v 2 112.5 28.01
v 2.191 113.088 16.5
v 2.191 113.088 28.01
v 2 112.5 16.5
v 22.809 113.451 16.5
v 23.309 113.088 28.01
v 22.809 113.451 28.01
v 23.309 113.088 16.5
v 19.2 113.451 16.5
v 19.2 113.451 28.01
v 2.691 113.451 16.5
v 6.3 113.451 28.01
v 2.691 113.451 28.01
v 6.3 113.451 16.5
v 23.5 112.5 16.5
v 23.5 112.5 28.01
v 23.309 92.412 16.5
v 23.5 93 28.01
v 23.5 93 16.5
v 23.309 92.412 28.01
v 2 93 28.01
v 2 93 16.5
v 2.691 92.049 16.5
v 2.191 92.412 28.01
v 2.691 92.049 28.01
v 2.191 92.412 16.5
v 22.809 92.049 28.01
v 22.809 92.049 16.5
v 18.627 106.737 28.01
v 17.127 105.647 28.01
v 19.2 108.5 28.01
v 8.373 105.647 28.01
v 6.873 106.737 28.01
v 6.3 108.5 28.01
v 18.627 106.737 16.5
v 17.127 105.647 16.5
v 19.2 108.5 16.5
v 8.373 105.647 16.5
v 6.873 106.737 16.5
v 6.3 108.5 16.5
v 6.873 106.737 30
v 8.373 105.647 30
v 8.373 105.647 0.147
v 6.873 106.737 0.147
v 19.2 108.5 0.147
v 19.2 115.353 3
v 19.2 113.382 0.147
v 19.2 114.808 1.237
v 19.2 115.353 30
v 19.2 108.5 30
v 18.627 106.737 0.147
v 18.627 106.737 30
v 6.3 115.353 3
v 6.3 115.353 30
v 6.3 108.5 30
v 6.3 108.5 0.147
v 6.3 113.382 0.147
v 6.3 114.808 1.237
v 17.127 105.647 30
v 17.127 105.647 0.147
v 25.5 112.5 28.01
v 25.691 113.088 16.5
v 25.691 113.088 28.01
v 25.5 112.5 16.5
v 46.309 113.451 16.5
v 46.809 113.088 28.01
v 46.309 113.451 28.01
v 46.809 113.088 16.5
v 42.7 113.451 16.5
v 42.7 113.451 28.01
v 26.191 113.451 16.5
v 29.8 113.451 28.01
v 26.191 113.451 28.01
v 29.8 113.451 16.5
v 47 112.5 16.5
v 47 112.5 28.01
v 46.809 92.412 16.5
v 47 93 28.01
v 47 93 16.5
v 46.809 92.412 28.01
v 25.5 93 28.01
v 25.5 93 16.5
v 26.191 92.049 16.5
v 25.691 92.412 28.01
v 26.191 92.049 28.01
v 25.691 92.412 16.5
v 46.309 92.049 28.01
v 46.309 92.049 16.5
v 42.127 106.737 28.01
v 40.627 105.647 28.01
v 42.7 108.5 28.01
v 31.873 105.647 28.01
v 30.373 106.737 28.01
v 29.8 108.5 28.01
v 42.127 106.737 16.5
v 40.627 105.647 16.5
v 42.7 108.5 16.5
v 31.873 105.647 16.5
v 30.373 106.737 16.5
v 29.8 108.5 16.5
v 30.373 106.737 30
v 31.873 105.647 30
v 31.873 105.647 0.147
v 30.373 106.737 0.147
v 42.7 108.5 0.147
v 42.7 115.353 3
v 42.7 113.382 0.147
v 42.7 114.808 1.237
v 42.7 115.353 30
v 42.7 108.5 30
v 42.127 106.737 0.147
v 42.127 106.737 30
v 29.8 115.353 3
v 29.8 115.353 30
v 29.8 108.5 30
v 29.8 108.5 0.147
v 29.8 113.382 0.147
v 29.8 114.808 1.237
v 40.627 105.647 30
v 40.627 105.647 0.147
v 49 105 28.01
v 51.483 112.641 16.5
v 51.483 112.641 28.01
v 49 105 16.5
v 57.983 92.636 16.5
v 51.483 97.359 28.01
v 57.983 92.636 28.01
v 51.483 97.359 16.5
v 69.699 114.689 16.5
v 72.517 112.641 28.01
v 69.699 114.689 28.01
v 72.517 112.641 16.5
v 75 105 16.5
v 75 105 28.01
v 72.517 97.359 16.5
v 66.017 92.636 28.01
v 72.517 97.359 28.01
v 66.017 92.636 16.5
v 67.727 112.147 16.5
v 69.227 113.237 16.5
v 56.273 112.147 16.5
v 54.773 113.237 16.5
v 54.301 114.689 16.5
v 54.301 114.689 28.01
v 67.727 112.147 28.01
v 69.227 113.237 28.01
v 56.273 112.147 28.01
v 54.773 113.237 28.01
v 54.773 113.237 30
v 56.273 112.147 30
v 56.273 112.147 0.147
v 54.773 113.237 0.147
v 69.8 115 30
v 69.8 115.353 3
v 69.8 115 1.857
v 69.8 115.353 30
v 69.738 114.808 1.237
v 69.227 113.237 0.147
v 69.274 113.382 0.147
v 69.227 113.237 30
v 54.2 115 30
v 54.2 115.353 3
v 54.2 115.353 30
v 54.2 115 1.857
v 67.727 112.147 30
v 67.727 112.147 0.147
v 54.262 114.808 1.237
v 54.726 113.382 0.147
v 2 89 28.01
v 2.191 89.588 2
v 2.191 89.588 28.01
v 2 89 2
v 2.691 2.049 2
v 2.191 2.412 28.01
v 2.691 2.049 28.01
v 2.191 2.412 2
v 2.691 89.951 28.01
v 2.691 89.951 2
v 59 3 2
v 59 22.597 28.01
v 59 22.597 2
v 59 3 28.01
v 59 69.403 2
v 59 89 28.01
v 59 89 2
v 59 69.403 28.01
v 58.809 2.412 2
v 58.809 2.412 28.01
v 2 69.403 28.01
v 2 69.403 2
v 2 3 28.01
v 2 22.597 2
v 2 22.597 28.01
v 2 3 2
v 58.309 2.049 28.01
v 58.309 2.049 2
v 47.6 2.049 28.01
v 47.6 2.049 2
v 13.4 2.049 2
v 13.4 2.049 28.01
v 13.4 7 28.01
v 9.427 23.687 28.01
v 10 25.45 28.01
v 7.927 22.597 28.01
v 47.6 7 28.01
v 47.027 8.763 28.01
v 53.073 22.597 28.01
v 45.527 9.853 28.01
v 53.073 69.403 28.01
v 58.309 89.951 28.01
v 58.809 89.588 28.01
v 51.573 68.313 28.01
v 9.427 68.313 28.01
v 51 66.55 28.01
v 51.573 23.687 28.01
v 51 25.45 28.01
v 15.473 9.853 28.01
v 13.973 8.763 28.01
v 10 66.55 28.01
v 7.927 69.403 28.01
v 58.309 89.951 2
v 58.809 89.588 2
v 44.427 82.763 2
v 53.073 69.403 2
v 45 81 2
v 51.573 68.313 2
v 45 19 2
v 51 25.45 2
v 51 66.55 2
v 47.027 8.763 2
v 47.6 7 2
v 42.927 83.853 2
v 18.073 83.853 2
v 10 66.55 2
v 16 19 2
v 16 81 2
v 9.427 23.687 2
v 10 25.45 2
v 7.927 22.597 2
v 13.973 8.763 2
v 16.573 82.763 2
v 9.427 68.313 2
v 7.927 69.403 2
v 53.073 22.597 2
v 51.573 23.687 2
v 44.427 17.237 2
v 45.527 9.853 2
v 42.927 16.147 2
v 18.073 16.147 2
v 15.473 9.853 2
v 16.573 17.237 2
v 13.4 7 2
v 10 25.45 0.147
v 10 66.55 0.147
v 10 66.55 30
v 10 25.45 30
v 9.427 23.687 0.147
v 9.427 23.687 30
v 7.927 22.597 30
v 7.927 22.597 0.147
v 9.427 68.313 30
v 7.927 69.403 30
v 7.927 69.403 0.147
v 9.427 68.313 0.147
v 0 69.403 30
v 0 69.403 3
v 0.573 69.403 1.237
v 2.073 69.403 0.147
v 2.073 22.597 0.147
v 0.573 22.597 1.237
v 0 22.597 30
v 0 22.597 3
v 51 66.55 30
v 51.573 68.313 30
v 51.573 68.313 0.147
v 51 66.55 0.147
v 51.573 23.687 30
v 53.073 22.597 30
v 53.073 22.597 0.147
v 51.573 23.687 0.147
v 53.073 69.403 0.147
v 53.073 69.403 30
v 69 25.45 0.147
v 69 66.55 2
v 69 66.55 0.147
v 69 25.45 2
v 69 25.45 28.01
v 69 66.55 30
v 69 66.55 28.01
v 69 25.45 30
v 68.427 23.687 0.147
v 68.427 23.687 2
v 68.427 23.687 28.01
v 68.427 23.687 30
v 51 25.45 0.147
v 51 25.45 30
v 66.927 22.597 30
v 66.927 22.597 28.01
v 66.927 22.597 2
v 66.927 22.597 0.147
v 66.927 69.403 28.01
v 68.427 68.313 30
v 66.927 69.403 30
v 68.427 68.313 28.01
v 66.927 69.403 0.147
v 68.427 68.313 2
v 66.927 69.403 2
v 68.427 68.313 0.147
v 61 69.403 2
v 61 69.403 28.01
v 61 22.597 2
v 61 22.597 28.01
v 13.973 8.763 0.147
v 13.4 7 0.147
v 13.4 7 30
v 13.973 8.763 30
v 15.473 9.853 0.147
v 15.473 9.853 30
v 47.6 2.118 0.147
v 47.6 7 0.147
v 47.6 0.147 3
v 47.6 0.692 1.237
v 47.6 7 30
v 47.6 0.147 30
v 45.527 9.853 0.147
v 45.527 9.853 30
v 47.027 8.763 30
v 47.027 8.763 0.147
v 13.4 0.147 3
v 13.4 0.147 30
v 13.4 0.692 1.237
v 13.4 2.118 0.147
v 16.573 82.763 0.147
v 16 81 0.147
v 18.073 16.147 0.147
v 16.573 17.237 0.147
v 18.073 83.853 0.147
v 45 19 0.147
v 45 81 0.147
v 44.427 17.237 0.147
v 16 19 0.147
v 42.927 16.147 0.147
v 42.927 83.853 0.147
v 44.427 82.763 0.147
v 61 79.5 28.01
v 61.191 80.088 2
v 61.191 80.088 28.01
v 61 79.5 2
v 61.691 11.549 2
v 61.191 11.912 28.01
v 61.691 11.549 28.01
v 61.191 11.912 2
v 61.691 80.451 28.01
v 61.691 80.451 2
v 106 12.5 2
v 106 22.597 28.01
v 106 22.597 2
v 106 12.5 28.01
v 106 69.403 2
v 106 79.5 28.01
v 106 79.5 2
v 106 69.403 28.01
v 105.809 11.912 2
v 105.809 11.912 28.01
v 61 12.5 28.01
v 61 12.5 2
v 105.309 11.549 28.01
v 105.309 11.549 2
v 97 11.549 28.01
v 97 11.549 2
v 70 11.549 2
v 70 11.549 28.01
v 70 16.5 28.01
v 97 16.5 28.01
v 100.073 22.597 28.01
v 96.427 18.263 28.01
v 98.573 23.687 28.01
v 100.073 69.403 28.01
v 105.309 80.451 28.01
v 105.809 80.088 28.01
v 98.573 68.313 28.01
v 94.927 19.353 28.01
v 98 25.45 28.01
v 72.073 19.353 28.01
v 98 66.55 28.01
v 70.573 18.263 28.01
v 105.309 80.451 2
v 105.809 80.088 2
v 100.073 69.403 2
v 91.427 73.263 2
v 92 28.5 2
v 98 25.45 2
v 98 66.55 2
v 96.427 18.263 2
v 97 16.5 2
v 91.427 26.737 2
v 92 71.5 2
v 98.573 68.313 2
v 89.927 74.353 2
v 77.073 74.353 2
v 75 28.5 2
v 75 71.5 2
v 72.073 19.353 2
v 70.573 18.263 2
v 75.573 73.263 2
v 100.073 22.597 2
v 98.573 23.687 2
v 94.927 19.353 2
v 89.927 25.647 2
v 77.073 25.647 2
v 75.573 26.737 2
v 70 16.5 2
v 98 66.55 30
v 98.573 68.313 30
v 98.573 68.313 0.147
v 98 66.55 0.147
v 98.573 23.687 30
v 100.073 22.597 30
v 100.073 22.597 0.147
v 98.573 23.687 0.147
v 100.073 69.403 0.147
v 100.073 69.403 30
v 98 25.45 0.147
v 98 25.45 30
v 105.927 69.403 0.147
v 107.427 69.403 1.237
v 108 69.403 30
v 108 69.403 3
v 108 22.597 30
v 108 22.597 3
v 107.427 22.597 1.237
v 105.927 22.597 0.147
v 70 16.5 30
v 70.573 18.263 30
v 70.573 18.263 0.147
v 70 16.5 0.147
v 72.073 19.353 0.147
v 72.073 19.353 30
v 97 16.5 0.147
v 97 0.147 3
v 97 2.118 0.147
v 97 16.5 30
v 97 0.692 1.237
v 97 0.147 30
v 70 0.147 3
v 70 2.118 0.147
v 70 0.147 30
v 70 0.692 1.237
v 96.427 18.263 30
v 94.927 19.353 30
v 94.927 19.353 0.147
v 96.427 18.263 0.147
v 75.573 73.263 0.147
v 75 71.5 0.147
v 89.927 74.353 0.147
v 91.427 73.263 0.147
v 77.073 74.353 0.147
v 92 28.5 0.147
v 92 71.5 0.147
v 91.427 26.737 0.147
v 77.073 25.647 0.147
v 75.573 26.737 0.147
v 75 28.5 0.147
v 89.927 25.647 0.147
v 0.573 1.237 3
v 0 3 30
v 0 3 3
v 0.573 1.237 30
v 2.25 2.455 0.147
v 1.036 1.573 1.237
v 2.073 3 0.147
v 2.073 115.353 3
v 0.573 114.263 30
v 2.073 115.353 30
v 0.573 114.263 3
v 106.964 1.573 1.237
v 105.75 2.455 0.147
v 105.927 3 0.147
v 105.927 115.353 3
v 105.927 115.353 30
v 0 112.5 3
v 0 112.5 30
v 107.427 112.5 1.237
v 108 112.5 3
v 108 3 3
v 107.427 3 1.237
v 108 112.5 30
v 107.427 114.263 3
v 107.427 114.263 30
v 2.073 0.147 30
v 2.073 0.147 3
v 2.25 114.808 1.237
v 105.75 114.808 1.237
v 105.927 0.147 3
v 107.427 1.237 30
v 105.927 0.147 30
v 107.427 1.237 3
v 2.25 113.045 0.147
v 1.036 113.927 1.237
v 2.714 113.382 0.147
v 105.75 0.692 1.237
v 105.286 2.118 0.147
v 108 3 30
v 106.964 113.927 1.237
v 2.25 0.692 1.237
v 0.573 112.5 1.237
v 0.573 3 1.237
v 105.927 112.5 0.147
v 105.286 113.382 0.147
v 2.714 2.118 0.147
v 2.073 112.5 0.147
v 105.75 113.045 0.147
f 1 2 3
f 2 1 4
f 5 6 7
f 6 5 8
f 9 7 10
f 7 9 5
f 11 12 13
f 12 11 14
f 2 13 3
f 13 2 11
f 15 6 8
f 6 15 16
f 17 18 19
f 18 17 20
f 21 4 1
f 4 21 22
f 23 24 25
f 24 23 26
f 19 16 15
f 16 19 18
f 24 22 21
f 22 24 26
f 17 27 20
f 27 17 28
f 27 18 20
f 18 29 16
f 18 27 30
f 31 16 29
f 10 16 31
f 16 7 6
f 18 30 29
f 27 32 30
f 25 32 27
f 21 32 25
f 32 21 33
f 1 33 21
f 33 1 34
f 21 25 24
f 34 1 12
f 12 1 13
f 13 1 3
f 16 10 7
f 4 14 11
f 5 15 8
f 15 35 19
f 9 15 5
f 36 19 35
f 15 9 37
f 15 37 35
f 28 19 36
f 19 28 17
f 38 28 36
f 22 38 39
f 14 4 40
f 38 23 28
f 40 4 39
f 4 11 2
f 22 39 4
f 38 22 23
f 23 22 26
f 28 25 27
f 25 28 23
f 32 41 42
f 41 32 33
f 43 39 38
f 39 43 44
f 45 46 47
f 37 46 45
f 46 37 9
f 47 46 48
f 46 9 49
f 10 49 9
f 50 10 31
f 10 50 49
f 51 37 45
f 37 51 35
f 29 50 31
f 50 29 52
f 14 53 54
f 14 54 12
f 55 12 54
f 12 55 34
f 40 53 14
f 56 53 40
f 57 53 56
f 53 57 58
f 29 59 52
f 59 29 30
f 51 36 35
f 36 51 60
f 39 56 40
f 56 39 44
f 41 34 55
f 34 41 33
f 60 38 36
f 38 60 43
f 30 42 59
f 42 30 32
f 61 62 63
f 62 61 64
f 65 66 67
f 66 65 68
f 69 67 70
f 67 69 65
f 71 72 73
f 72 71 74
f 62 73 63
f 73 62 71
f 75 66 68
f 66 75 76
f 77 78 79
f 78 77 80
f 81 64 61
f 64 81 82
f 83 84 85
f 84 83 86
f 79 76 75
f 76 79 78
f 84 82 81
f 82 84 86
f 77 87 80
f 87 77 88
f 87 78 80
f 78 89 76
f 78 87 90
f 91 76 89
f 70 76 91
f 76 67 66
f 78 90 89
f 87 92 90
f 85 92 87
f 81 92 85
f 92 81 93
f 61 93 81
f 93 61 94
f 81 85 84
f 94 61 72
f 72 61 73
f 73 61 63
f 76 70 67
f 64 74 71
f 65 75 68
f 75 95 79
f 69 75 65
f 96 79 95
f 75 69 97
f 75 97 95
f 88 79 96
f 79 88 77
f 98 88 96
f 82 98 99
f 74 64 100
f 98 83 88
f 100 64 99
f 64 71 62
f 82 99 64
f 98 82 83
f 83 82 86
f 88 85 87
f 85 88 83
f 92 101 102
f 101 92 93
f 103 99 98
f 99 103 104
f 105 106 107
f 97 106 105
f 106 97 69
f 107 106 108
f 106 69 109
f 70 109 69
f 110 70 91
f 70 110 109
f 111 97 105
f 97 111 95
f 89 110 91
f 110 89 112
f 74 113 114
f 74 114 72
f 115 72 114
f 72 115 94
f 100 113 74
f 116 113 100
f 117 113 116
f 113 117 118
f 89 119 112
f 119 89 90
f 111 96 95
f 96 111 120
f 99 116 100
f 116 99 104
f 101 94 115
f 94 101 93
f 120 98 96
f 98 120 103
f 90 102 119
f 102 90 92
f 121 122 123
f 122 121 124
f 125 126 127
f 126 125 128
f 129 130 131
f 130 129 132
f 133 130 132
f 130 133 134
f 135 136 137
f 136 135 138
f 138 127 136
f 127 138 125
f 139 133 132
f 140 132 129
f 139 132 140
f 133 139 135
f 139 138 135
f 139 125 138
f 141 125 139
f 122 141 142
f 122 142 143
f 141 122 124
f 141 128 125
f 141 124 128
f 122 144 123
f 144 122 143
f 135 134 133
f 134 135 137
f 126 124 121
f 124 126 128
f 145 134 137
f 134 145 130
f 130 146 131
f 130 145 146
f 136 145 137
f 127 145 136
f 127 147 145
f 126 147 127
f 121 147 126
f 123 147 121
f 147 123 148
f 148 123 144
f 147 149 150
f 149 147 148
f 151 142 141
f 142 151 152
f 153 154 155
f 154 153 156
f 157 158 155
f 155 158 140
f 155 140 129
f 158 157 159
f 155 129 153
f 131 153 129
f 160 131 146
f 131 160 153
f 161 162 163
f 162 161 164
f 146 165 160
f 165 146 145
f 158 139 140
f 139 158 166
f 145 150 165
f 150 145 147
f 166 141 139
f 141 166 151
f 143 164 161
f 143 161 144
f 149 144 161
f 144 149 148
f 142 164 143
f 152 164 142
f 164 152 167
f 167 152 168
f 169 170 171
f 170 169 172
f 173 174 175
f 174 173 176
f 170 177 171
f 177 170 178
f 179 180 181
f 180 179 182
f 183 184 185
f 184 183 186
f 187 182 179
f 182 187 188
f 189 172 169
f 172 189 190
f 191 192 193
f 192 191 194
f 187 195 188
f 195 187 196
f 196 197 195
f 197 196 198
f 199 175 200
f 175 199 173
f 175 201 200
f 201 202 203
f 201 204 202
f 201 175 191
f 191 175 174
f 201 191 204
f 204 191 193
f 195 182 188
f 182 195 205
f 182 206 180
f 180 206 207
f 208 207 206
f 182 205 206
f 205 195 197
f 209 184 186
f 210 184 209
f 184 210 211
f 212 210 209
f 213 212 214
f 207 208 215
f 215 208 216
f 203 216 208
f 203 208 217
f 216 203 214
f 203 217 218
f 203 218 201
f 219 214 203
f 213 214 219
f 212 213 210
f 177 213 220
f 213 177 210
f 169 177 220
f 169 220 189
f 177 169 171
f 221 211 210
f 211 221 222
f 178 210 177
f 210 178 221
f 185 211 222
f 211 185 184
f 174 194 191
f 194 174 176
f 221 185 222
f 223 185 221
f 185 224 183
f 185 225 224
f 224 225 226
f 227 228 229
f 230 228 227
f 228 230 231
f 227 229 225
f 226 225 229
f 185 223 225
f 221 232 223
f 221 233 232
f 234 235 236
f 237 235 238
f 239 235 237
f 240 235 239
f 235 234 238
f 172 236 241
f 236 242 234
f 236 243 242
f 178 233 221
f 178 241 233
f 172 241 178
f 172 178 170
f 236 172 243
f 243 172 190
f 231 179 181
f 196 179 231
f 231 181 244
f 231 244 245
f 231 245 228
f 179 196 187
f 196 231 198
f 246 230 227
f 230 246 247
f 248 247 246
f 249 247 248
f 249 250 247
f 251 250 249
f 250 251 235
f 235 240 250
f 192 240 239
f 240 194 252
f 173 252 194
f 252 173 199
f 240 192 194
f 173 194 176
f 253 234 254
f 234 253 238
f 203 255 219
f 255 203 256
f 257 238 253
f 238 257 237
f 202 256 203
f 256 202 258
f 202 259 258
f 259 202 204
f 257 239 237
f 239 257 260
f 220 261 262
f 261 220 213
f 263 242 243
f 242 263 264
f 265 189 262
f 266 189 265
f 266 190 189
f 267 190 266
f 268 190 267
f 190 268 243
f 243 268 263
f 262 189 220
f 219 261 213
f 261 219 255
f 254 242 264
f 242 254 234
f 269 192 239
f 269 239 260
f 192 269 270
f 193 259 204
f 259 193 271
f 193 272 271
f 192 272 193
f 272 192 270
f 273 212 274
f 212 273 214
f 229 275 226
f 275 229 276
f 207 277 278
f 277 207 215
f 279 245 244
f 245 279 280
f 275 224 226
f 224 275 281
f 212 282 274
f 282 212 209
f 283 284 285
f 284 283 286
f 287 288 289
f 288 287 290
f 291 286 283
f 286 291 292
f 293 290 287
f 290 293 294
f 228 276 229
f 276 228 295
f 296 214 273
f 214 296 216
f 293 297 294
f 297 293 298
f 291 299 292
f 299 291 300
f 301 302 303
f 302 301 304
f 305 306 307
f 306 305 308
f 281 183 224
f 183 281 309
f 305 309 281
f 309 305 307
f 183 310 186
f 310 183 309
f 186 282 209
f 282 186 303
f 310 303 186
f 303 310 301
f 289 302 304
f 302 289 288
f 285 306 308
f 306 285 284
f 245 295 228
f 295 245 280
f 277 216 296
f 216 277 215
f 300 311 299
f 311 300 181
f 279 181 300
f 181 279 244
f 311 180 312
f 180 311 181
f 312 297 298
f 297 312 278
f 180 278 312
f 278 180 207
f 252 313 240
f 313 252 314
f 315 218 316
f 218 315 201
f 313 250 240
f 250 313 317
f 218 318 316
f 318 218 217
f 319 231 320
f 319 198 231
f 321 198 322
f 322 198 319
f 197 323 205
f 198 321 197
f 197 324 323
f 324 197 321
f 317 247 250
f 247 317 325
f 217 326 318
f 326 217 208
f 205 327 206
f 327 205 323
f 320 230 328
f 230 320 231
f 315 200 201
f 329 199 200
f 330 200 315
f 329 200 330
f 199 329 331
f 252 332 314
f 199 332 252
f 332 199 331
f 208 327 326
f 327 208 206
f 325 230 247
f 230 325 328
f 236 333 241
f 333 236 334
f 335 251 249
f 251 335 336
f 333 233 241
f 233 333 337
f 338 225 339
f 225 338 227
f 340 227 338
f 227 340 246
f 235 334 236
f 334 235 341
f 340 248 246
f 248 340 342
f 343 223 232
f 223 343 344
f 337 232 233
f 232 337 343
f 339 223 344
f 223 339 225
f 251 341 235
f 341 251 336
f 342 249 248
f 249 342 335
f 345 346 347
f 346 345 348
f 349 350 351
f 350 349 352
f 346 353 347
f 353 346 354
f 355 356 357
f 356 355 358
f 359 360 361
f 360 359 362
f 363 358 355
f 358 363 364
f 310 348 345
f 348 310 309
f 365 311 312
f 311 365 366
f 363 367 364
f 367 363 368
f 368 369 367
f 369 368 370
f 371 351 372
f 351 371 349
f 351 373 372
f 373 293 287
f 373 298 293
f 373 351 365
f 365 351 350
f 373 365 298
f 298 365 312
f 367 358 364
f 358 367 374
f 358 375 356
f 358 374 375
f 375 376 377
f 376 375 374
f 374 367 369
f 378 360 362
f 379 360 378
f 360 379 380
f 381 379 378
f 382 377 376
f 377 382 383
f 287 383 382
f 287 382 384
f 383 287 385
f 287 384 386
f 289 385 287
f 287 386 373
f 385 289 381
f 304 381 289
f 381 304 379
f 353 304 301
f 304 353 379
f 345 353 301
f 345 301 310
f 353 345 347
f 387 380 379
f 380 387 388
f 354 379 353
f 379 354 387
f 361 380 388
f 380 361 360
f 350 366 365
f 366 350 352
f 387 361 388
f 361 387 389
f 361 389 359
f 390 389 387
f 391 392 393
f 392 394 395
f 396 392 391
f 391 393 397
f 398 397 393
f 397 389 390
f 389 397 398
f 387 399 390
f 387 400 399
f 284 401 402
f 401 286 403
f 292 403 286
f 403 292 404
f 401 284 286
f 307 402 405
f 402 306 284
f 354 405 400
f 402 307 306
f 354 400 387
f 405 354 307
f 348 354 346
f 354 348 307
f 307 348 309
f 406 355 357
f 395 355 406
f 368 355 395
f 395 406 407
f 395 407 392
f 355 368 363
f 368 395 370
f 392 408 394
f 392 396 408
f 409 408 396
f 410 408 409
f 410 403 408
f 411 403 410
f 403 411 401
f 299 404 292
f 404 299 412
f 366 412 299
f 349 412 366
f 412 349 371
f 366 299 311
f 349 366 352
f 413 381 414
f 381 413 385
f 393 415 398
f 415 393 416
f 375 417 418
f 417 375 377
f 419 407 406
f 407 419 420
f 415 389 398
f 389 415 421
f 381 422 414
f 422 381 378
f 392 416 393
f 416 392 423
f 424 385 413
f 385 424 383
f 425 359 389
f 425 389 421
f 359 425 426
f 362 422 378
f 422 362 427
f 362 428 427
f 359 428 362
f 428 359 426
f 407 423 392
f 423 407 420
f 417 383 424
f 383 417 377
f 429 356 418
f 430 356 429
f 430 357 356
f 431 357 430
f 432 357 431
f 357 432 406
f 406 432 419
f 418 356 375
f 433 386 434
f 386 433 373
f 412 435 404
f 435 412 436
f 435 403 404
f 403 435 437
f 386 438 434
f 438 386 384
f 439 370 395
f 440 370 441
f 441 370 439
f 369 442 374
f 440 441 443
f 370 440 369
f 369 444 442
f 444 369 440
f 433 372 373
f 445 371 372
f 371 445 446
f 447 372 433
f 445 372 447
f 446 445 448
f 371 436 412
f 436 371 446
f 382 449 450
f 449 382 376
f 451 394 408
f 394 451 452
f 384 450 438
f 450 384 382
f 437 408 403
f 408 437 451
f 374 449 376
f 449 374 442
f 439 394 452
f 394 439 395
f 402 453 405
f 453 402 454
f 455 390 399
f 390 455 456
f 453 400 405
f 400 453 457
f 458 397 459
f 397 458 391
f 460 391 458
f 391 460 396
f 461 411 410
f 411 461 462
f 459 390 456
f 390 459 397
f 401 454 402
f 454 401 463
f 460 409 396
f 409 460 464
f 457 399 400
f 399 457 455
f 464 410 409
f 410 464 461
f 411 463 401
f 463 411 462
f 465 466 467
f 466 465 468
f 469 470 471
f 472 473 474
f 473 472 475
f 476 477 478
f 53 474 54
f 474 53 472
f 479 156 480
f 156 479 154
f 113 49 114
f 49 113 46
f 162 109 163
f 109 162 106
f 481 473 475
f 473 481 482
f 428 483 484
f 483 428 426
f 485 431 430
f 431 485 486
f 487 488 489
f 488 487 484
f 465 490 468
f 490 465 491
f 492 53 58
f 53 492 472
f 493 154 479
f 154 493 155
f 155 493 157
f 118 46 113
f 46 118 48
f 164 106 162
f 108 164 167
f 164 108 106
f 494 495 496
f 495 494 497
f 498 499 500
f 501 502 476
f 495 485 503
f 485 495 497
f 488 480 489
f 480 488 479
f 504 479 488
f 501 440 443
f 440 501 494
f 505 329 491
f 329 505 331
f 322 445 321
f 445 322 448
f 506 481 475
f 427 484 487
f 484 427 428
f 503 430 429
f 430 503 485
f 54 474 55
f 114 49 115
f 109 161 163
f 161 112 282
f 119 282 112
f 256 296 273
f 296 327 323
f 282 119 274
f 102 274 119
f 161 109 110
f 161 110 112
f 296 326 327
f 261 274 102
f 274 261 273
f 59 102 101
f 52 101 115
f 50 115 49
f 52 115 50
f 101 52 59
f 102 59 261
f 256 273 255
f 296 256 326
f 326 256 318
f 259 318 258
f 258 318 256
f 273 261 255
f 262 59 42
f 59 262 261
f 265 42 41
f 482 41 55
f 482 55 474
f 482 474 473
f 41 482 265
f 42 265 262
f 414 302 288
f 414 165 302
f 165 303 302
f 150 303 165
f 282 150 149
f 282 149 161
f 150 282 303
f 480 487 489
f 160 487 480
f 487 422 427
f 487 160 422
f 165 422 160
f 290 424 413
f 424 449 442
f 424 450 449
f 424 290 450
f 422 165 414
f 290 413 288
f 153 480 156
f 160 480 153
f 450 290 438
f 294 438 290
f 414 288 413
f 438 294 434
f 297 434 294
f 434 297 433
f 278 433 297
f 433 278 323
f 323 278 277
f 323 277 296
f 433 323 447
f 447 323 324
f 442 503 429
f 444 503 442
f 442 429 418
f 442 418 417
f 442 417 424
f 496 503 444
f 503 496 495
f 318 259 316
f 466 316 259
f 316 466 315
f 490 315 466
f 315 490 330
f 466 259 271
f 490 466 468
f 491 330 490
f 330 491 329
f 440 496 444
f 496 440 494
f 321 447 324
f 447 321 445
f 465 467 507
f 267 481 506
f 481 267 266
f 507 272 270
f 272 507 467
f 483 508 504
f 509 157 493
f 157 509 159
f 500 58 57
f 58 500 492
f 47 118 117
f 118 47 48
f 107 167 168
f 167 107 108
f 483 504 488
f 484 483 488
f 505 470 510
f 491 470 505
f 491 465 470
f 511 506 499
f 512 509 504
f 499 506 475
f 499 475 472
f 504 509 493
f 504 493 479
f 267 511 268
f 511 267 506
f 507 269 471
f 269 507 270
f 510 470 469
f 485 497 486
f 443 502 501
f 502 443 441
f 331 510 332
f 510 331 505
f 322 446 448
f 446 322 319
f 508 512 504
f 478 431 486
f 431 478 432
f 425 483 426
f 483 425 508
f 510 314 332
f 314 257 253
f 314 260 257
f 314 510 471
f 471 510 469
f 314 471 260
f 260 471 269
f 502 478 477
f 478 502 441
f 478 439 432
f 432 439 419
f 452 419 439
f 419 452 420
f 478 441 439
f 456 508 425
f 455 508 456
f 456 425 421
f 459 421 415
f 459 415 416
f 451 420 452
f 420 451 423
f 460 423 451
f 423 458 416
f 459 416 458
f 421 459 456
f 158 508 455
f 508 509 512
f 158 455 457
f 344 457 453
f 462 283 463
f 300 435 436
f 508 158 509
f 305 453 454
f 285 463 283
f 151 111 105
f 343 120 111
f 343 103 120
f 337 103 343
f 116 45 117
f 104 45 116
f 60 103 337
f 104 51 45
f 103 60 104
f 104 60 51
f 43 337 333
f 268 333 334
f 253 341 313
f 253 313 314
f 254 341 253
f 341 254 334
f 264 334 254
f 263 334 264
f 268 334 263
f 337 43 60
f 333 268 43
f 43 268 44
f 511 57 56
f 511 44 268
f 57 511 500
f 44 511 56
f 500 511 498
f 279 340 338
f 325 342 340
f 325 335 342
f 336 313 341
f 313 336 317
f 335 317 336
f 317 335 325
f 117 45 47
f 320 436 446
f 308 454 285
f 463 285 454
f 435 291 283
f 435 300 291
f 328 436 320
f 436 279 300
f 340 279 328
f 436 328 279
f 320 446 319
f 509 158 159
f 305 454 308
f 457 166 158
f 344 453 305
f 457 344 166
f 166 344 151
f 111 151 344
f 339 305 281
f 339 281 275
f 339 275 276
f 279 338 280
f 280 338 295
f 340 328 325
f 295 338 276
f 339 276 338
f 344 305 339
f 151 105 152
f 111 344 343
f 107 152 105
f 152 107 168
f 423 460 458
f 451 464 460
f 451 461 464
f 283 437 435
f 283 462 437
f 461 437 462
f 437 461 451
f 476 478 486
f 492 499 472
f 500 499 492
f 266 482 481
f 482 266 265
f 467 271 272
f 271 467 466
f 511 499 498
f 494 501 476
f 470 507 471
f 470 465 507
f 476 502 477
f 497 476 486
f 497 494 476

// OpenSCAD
// file: ../../vendor/honeycomb.scad
/**
 * Honeycomb library
 * License: Creative Commons - Attribution
 * Copyright: Gael Lafond 2017
 * URL: https://www.thingiverse.com/thing:2484395
 *
 * Inspired from:
 *   https://www.thingiverse.com/thing:1763704
 */

// a single filled hexagon
module hexagon(l)  {
	circle(d=l, $fn=6);
}

// parametric honeycomb  
module honeycomb(x, y, dia, wall)  {
	// Diagram
	//          ______     ___
	//         /     /\     |
	//        / dia /  \    | smallDia
	//       /     /    \  _|_
	//       \          /   ____ 
	//        \        /   / 
	//     ___ \______/   / 
	// wall |            /
	//     _|_  ______   \
	//         /      \   \
	//        /        \   \
	//                 |---|
	//                   projWall
	//
	smallDia = dia * cos(30);
	projWall = wall * cos(30);

	yStep = smallDia + wall;
	xStep = dia*3/2 + projWall*2;

	difference()  {
		square([x, y]);

		// Note, number of step+1 to ensure the whole surface is covered
		for (yOffset = [0:yStep:y+yStep], xOffset = [0:xStep:x+xStep]) {
			translate([xOffset, yOffset]) {
				hexagon(dia);
			}
			translate([xOffset + dia*3/4 + projWall, yOffset + (smallDia+wall)/2]) {
				hexagon(dia);
			}
		}
	}
}
// file: ../../lib/util/util_functions.scad
function sum(v) = [for(p = v) 1] * v;

function take_sum(v, i) = i == 0 
  ? 0 
  : sum([for(a=[0:i-1]) v[a]]);

// input : nested list
// output : list with the outer level nesting removed
function flatten(l) = [ for (a = l) for (b = a) b ] ;
// file: ../../lib/primitive/rounded_square.scad
$bleed = 1;
$rounding = 3;

module rounded_square(size, flat_top=false, flat_bottom=false) {
  assert(!(flat_top && flat_bottom), "Flat top and flat bottom are exclusive");

  rounding_height = flat_top || flat_bottom 
    ? $rounding 
    : $rounding * 2;

  offset = flat_bottom ? 0 : $rounding;

  inner_size = [
    size[0] - $rounding * 2,
    size[1] - rounding_height,
  ];

  minkowski() {
    translate([$rounding, offset]) {
      square(inner_size);
    }
    if (flat_top ) {
      difference() {
        circle($rounding);
        translate([-$rounding, 0]) {
          square([$rounding * 2, $rounding]);
        }
      }
    } else if (flat_bottom) {
      difference() {
        circle($rounding);
        translate([-$rounding, -$rounding]) {
          square([$rounding * 2, $rounding]);
        }
      }
    } else {
      circle($rounding);
    }
  }
}
// file: ../../lib/design/honeycomb.scad
include <../../vendor/honeycomb.scad>
include <../primitive/rounded_cube.scad>

$wall_thickness = 2;
$bleed = 0.01;
$hexagons_per_side = 2;

function relative_diameter(dimensions) = (
  min(
    dimensions[0],
    dimensions[1]) + $wall_thickness
  ) / $hexagons_per_side;

function honeycomb_inset_size(size, inset = $wall_thickness) = [
    size[0] - $wall_thickness,
    size[1] - inset * 2,
    size[2] + $bleed * 2,
];

module block_border(dimensions) {
  inner_dimensions = [
    dimensions[0] - $wall_thickness * 2,
    dimensions[1] - $wall_thickness * 2,
    dimensions[2] + $bleed * 2
  ];

  difference() {
    rounded_cube(dimensions, flat_top=true, flat_bottom=true);

    translate([$wall_thickness, $wall_thickness, -$bleed]) {
      rounded_cube(inner_dimensions, flat_top=true, flat_bottom=true);
    }
  }
}

module negative_honeycomb_cube(dimensions, diameter=-1) {
  honeycomb_size = [
    dimensions[0],
    dimensions[1],
    dimensions[2] + $bleed * 2,
  ];

  difference() {
    cube(dimensions);
    translate([0, 0, -$bleed]) {
      honeycomb_cube(dimensions, diameter);
    }
  }
}

module honeycomb_cube(dimensions, diameter=-1) {
  _diameter = diameter > 0
    ? diameter
    : relative_diameter(dimensions);

  linear_extrude(dimensions[2]) {
    honeycomb(dimensions[0], dimensions[1], _diameter, $wall_thickness);
  }
}

module honeycomb_spacer(dimensions) {
  honeycomb_cube(dimensions);

  block_border(dimensions);
}
// file: ../../lib/layout/grid_utils.scad
include <../util/util_functions.scad>

$wall_thickness = 2;

function make_grid_of(matrix, item) = [for(x=[0:matrix[0]-1]) [for(y=[0:matrix[1]-1]) item]];

// Return a single row from a grid
function grid_row(grid, row) = [for(i=[0:len(grid)-1]) grid[i][row]];

// Map to just the given index of a list of arrays
//
// list = [[1, 2,],[3, 4]];
// pick_list(list, 0) -> [1, 3]
// pick_list(list, 1) -> [2, 4]
function pick_list(list, index) = [for(i=[0:len(list)-1]) list[i][index]];

// Map to just the given index of a grid row
//
// grid = [
//   [[1, 2,], [3, 4]],
//   [[5, 6,], [7, 8]],
// ];
// pick_row(grid, 0, 1) -> [2, 6]
// pick_row(grid, 1, 0) -> [3, 7]
function pick_row(grid, row, key) = pick_list(grid_row(grid, row), key);

// Map to just the given index of a grid column
//
// grid = [
//   [[1, 2,], [3, 4]],
//   [[5, 6,], [7, 8]],
// ];
// pick_col(grid, 0, 1) -> [2, 4]
// pick_col(grid, 1, 0) -> [5, 7]
function pick_col(grid, col, key) = pick_list(grid[col], key);

function pick_grid(grid, key) = [for(i=[0:len(grid)-1]) for(j=[0:len(grid[i])-1]) grid[i][j][key]];

function sum_row(grid, row, key) = sum(pick_row(grid, row), key);
function sum_col(grid, col, key) = sum(pick_col(grid, col), key);

function slice_to(list, end) = [for(i=[0:end]) list[i]];
function slice_from(list, start) = [for(i=[start:len(list)-1]) list[i]];

function accumulate(list) = [for(i=[0:len(list)-1]) sum(slice_to(list, i))];

function add_grid_xy(grid, add) = [for(x=[0:len(grid)-1]) [for(y=[0:len(grid[x])-1]) [
    grid[x][y][0] + add[0],
    grid[x][y][1] + add[1],
]]];
function add_grid_xyz(grid, add) = [for(x=[0:len(grid)-1]) [for(y=[0:len(grid[x])-1]) [
    grid[x][y][0] + add[0],
    grid[x][y][1] + add[1],
    add[2],
]]];

function max_grid(grid) = [for(x=[0:len(grid)-1]) [for(y=[0:x < 0 ? 0 : len(grid[x])-1]) [
    max(pick_col(grid, x, 0)),
    max(pick_row(grid, y, 1)),
]]];

function median_grid(grid) = [for(x=[0:len(grid)-1]) [for(y=[0:x < 0 ? 0 : len(grid[x])-1]) [
  (max(pick_col(grid, x, 0)) + min(pick_col(grid, x, 0))) / 2,
  (max(pick_row(grid, y, 1)) + min(pick_row(grid, y, 1))) / 2,
]]];

function walled_grid(grid) = add_grid_xy(grid, [$wall_thickness, $wall_thickness]);

function accumulated_grid(grid) = [for(x=[-1:len(grid)-1]) [for(y=[-1:x < 0 ? 0 : len(grid[x])-1]) [
  x < 0 ? 0 : sum([for(i=[0:x]) max(pick_col(grid, i, 0))]),
  y < 0 ? 0 : sum([for(i=[0:y]) max(pick_row(grid, i, 1))]),
]]];

function accumulated_grid_x(grid) = grid[len(grid)-1][0][0];
function accumulated_grid_y(grid) = max([for(i=[0:len(grid)-1]) grid[i][len(grid[i])-1][1]]);
function accumulated_grid_rect(grid) = [
  accumulated_grid_x(grid),
  accumulated_grid_y(grid),
];
function accumulated_grid_cube(grid, height=0) = [
  accumulated_grid_x(grid),
  accumulated_grid_y(grid),
  height
];

module print_grid(grid) {
  for(i=[len(grid[0])-1:-1:0]) {
    echo(i, grid_row(grid, i));
  }
  echo("");
}
// file: ../../lib/layout/layout.scad
$padding = 0.5;
$wall_thickness = 2;
$padding_rect = [$padding * 2, $padding * 2];
$wall_rect = [$wall_thickness, $wall_thickness];

function stack_height (size, count=1) = size * count + $padding;

function padded_offset (length, index=1) = (length + $padding * 2 + $wall_thickness) * index;

function offset (size, index=1) = (size + $wall_thickness) * index;

function pad (size) = size + $padding * 2;

function divide_rect(rect, operand) = [rect[0] / operand, rect[1] / operand];
function multiply_rect(rect, operand) = [rect[0] * operand, rect[1] * operand];

function divide_cube(rect, operand) = [rect[0] / operand, rect[1] / operand, rec[2] / operand];
function multiply_cube(rect, operand) = [rect[0] * operand, rect[1] * operand, rect[2] * operand];

function offset_centre_in_box(size, bounding_box) = divide_rect(bounding_box - size, 2);

module offset_cylinder(d, h) {
  translate([d / 2, d / 2, 0]) {
    cylinder(d=d, h=h);
  }
}

module offset_circle(d) {
  translate([d / 2, d / 2, 0]) {
    circle(d=d);
  }
}

module offset_square(size, center=false) {
  translate([size[0] / 2, size[1] / 2, 0]) {
    square(size, center=center);
  }
}
// file: ../../lib/primitive/rounded_cube.scad
include <./rounded_square.scad>

$bleed = 1;
$rounding = 3;

// Render a rounded cube
// flat_top: do not round the top edges
// flat_bottom: do not round the bottom edges
// flat: equals flat_top && flat_bottom
// 
// Limitations:
// requires height > $rounding * 2
// flat_top || flat_bottom requires height > $rounding
// flat_top && flat_bottom requires height > $bleed
module rounded_cube(
  size, 
  flat=false, 
  flat_top=false, 
  flat_bottom=false,
  side_rounding=-1
) {
  _flat = flat || (flat_top && flat_bottom);
  _flat_top = flat_top || flat;
  _flat_bottom = flat_bottom || flat;
  _rounding = min($rounding, size[2] / 2);
  _side_rounding = side_rounding > -1 ? side_rounding: $rounding;

  assert(_side_rounding >= $rounding, "side rounding cannot be less than rounding");

  top_height = _flat_top ? 0: _rounding;
  bottom_height = _flat_bottom ? 0: _rounding;

  cube_size = [
    size[0] - _rounding * 2,
    size[1] - _rounding * 2,
    size[2] - (top_height + bottom_height)
  ];

  if (_flat_top && _flat_bottom) {
     linear_extrude(cube_size[2]) {
       rounded_square([size[0], size[1]]);
     }
   } else {
     minkowski() {
       translate([_rounding, _rounding, bottom_height]) {
         if (_side_rounding != _rounding) {
           linear_extrude(cube_size[2]) {
             rounded_square([cube_size[0], cube_size[1]], $rounding=_side_rounding);
           }
         } else {
           cube(cube_size);
         }
       }

       if (_flat_top) {
         difference() {
           sphere(_rounding);
           cylinder(_rounding, _rounding, _rounding);
         }
       } else if (_flat_bottom) {
         difference() {
           sphere(_rounding);
           translate ([0, 0, -_rounding]) {
             cylinder(_rounding, _rounding, _rounding);
           }
         }
       } else {
         sphere(_rounding);
       }
    }
  }
}
// file: ../../lib/compound/tile_stack_round.scad
include <../layout/layout.scad>
include <./tile_stack.scad>

$wall_thickness = 2;
$bleed = 0.01;
$padding = 0.5;
$inset = 8;
$cutout_fraction = 0.6;
$cutout_lid_height = $wall_thickness;

module tile_stack_round(
  diameter, 
  tile_height,
  count=1, 
  roof_height,
  left_cutout=false, 
  right_cutout=false,
  top_cutout=false,
  bottom_cutout=false
) {
  // No need to render any cutout if the size is zero
  if (count > 0) {
    tray_size = [
      pad(diameter),
      pad(diameter),
      stack_height(tile_height, count) + $bleed,
    ];
  
    floor_height = roof_height - tray_size[2] + $bleed;
  
    translate([tray_size[0]/2, tray_size[1]/2, floor_height]) {
      cylinder(tray_size[2], tray_size[0]/2, tray_size[0]/2);
    }
    
    if (left_cutout) {
      left_cutout_size = [
        $inset * 2 + $wall_thickness,
        tray_size[1] * $cutout_fraction,
        roof_height + $cutout_lid_height + $bleed * 2,
      ];
  
      translate([-left_cutout_size[0] + $inset, (tray_size[1] - left_cutout_size[1]) / 2, 0]) {
        rounded_cube(left_cutout_size, flat=true);
      }
    }
  
    if (right_cutout) {
      right_cutout_size = [
        $inset * 2 + $wall_thickness,
        tray_size[1] * $cutout_fraction,
        roof_height + $cutout_lid_height + $bleed * 2,
      ];
  
      translate([tray_size[0] - $inset, (tray_size[1] - right_cutout_size[1]) / 2, 0]) {
        rounded_cube(right_cutout_size, flat=true);
      }
    }
  
    if (top_cutout) {
      top_cutout_size = [
        tray_size[0] * $cutout_fraction,
        $inset * 2 + $wall_thickness,
        roof_height + $cutout_lid_height + $bleed * 2,
      ];
  
      translate([
        (tray_size[0] - top_cutout_size[0]) / 2, 
        tray_size[1] + $wall_thickness - $inset,
        0
      ]) {
        rounded_cube(top_cutout_size, flat=true);
      }
    }

    if (bottom_cutout) {
      bottom_cutout_size = [
        tray_size[0] * $cutout_fraction,
        $inset * 2 + $wall_thickness,
        roof_height + $cutout_lid_height +  $bleed * 2,
      ];
  
      translate([
        (tray_size[0] - bottom_cutout_size[0]) / 2, 
        0 - bottom_cutout_size[1] - $wall_thickness + $inset,
        0
      ]) {
        rounded_cube(bottom_cutout_size, flat=true);
      }
    }
  }
}
// file: ../../lib/compound/tile_stack.scad
include <./notched_cube.scad>

module tile_stack(
  tile_size,
  tile_count=1,
  height,
  left_cutout=false,
  right_cutout=false,
  top_cutout=false,
  bottom_cutout=false,
  pill=false
) {
  size = [
    pad(tile_size[0]),
    pad(tile_size[1]),
    height,
  ];

  // floor_height = height - stack_height(tile_size[2], tile_count) + $bleed;
  // TODO do we need bleed?
  floor_height = height - stack_height(tile_size[2], tile_count);

  // No need to render any cutout if the size is zero
  if (tile_count > 0) {
    notched_cube(
      size,
      floor_height,
      left_cutout=left_cutout,
      right_cutout=right_cutout,
      top_cutout=top_cutout,
      bottom_cutout=bottom_cutout,
      pill=pill
    );
  }
}
// file: ../../lib/config/card_sizes.scad
include <../layout/layout.scad>

/**
 * Mini european size eg The crew tasks
 */
mini_euro_card_size = [
  44,
  68,
];

/**
 * Standard card size eg MTG
 * Sleeved with either gamegenic gray or mayday green
 */
standard_sleeved_card_size = [
  67,
  91.5,
];

/**
 * Standard card size eg MTG
 */
standard_card_size = [
  63,
  88,
];

/**
 * Standard USA card size eg Bohnanza
 */
standard_usa_card_size = [
  56,
  87
];
// file: ../../lib/compound/notched_cube.scad
include <../layout/layout.scad>
include <../design/honeycomb.scad>

$wall_thickness = 2;
$bleed = 0.01;
$padding = 0.5;
$inset = 6;
$cutout_fraction = 0.6;
$cutout_lid_height = $wall_thickness;

// I have no idea why it needs to be this vaule
// Seems to be to do with how the cube handles rounding
magic_pill_number = 0.4;

// TODO review pill feature, it's been changed to include padding so
// the magic pill number might no longer be needed
function cutout_rounding (size, pill=false) = pill
  ? min(size[0], size[1]) / 2  + magic_pill_number:
  1;

function cutout_fraction_size(length) = length * $cutout_fraction;

function cutout_fraction_rect(rect) = [
  cutout_fraction_size(rect[0]),
  cutout_fraction_size(rect[1]),
];

module notched_cube(
  size,
  floor_height=$wall_thickness,
  left_cutout=false,
  right_cutout=false,
  top_cutout=false,
  bottom_cutout=false,
  honeycomb_diameter=undef,
  pill=false,
  floor_cutout=false,
  cutout_size=undef,
  bounding_box=undef,
) {
  _bounding_box = bounding_box == undef ? size : bounding_box;
  cutout_fraction = cutout_fraction_size(cutout_size == undef ? size : cutout_size);

  assert(size[2] > floor_height, "Box height shorter than floor height");
  assert(size[0] <= _bounding_box[0], "Bounding box must be greater than or equal to size");
  assert(size[1] <= _bounding_box[1], "Bounding box must be greater than or equal to size");

  honeycomb_base = honeycomb_diameter != undef;
  inset_length = $inset * 2 + $wall_thickness;
  box_offset = offset_centre_in_box(size, _bounding_box);

  cutout_size = [
    size[0],
    size[1],
    size[2] - floor_height + $bleed,
  ];

  translate(box_offset) {
    translate([0, 0, floor_height]) {
      rounded_cube(cutout_size, flat = true, $rounding = cutout_rounding(size, pill));
    }

    if (left_cutout) {
      left_cutout_size = [
        inset_length + box_offset[0],
        cutout_fraction[1],
        size[2] + $cutout_lid_height + $bleed * 2,
      ];

      translate([
        - left_cutout_size[0] + $inset,
        (size[1] - left_cutout_size[1]) / 2,
        0
      ]) {
        rounded_cube(left_cutout_size, flat = true);
      }
    }

    if (right_cutout) {
      right_cutout_size = [
        inset_length + box_offset[0],
        cutout_fraction[1],
        size[2] + $cutout_lid_height + $bleed * 2,
      ];

      translate([
        size[0] - $inset,
        (size[1] - right_cutout_size[1]) / 2,
        0
      ]) {
        rounded_cube(right_cutout_size, flat = true);
      }
    }

    if (top_cutout) {
      top_cutout_size = [
        cutout_fraction[0],
        inset_length + box_offset[1],
        size[2] + $cutout_lid_height + $bleed * 2,
      ];

      translate([
        (size[0] - top_cutout_size[0]) / 2,
        size[1] - $inset,
        0
      ]) {
        rounded_cube(top_cutout_size, flat = true);
      }
    }

    if (bottom_cutout) {
      bottom_cutout_size = [
        cutout_fraction[0],
        inset_length + box_offset[1],
        size[2] + $cutout_lid_height + $bleed * 2,
      ];

      translate([
        (size[0] - bottom_cutout_size[0]) / 2,
        - bottom_cutout_size[1] + $inset,
        0
      ]) {
        rounded_cube(bottom_cutout_size, flat = true);
      }
    }

    // clearences to help place things inside without hitting the other cutouts
    frame_thickness = honeycomb_base ? $wall_thickness : ($wall_thickness * 3);

    left_clearance = (left_cutout ? $inset : 0) + frame_thickness;
    right_clearance = (right_cutout ? $inset : 0) + frame_thickness;
    top_clearance = (top_cutout ? $inset : 0) + frame_thickness;
    bottom_clearance = (bottom_cutout ? $inset : 0) + frame_thickness;

    floor_cutout_size = [
      size[0] - left_clearance - right_clearance,
      size[1] - top_clearance - bottom_clearance,
      floor_height + $bleed * 2,
    ];

    if (honeycomb_base || floor_cutout) {
      translate([left_clearance, bottom_clearance, - $bleed]) {
        if (honeycomb_base) {
          negative_honeycomb_cube(floor_cutout_size, honeycomb_diameter);
        } else if (floor_cutout) {
          rounded_cube(floor_cutout_size, flat = true);
        }
      }
    }
  }
}
// file: ../../lib/tray/card_tray.scad
include <../primitive/rounded_cube.scad>
include <../compound/notched_cube.scad>
include <../layout/layout.scad>
include <../layout/grid_utils.scad>

// Config
// $fn = 50;
$fn = 10;
$wall_thickness = 2;

// Default padding is for tokens
// Cards need more space than tokens
// default was really tight
// 2 was a bit loose
// 1 was...ok
$padding = 1;
$rounding = 2;
$bleed = 0.01;

function padded_card_size_grid(cards, height) = add_grid_xyz(cards, [$padding * 2, $padding * 2, height]);

function card_tray_grid_size(cards, height) = accumulated_grid_cube(accumulated_grid(walled_grid(padded_card_size_grid(cards, height))))
   + [$wall_thickness, $wall_thickness, height];

/**
 * Pad around the exact card size and create a tray of the given height.
 *
 * @param card_size [x, y]
 * @param height total height of the container
 */
module card_tray(card_size, height, matrix=[1, 1], honeycomb_diameter=undef) {
  // Support being passed a single card size and a matrix of repeat counts
  // or a matrix of card sizes. Normalise between the two sets of possible arguments.
  // probably better to have one call the other.
  card_size_grid = make_grid_of(matrix, card_size);

  card_tray_grid(card_size_grid, height, honeycomb_diameter);
}

/**
 * Create a box with card cutouts:
 * Pad around the exact card size and create a tray of the given height.
 *
 * @param grid of card_sizes [
 *   [[x, y],[x, y],[x, y]],
 *   [[x, y],[x, y],[x, y]],
 *   [[x, y],[x, y],[x, y]],
 * ]
 * @param height total height of the container
 */
module card_tray_grid(card_size_grid, height, honeycomb_diameter=undef) {
  card_offset_grid = accumulated_grid(walled_grid(padded_card_size_grid(card_size_grid, height)));

  box_size = [
    accumulated_grid_x(card_offset_grid) + $wall_thickness,
    accumulated_grid_y(card_offset_grid) + $wall_thickness,
    height,
  ];

  difference() {
    rounded_cube(box_size, flat_top=true);

    card_tray_grid_cutout(card_size_grid, height, honeycomb_diameter);
  }
}

/**
 * Pad around the exact card size cutout trays
 *
 * @param grid of card_sizes [
 *   [[x, y],[x, y],[x, y]],
 *   [[x, y],[x, y],[x, y]],
 *   [[x, y],[x, y],[x, y]],
 * ]
 * @param height total height of the container
 */
module card_tray_grid_cutout(
  card_size_grid,
  height,
  left_cutout=true,
  right_cutout=true,
  top_cutout=true,
  bottom_cutout=true,
  honeycomb_diameter=undef
) {
  // Add padding and set height for cutout
  card_cutout_size_grid = padded_card_size_grid(card_size_grid, height);
  normal_grid = max_grid(card_cutout_size_grid);
  median_grid = median_grid(card_cutout_size_grid);

  // Map layout offsets with wall thickness
  card_offset_grid = accumulated_grid(walled_grid(card_cutout_size_grid));

  translate([$wall_thickness, $wall_thickness, 0]) {
    for (x = [0:len(card_cutout_size_grid) - 1]) {
      for (y = [0:len(card_cutout_size_grid[x]) - 1]) {
        translate(card_offset_grid[x][y]) {
          notched_cube(
            card_cutout_size_grid[x][y],
            left_cutout = left_cutout,
            right_cutout = right_cutout,
            top_cutout = top_cutout,
            bottom_cutout = bottom_cutout,
            honeycomb_diameter = honeycomb_diameter,
            floor_cutout = !honeycomb_diameter,
            cutout_size = median_grid[x][y],
            bounding_box = normal_grid[x][y]
          );
        }
      }
    }
  }
}

module card_tray_top_spacer(card_size, height, matrix=[1, 1]) {
  card_spacer_size = [
    card_size[0] - $padding * 5,
    card_size[1] - $padding * 5,
    height,
  ];
  // spacer hole inset is proportional to the height
  card_spacer_hole_size = [
    card_spacer_size[0] - height * 4,
    card_spacer_size[1] - height * 4,
    height + $bleed * 2,
  ];

  card_cutout_size = card_cutout_size([
    card_size[0],
    card_size[1],
    0,
  ]);

  centre_offset = [
    (card_cutout_size[0] - card_spacer_size[0]) / 2,
    (card_cutout_size[1] - card_spacer_size[1]) / 2,
    0
  ];
  centre_hole_offset = [
    (card_spacer_size[0] - card_spacer_hole_size[0]) / 2,
    (card_spacer_size[1] - card_spacer_hole_size[1]) / 2,
    -$bleed
  ];

  join_length = $wall_thickness * 5;
  join_x_size = [
    cutout_fraction_size(card_size[0]) - $padding * 4,
    join_length,
    height,
  ];
  join_y_size = [
    join_length,
    cutout_fraction_size(card_size[1]) - $padding * 4,
    height,
  ];

  translate([$wall_thickness, $wall_thickness, 0]) {
    for (i = [0:matrix[0] - 1]) {
      for (j = [0:matrix[1] - 1]) {
        translate([
          offset(card_cutout_size[0], i),
          offset(card_cutout_size[1], j),
          0
        ]) {
          translate(centre_offset) {
            difference() {
              rounded_cube(card_spacer_size, flat = true);

              // middle hole space
              translate(centre_hole_offset) {
                rounded_cube(card_spacer_hole_size, flat = true);
              }
            }
          }

          // joins
          if (i < matrix[0] - 1) {
            translate([
              card_size[0] - $wall_thickness,
              (card_cutout_size[1] - join_y_size[1]) / 2,
              0
            ]) {
              cube(join_y_size);
            }
          }
          if (j < matrix[1] - 1) {
            translate([
              (card_cutout_size[0] - join_x_size[0]) / 2,
              card_size[1] - $wall_thickness,
              0
            ]) {
              cube(join_x_size);
            }
          }
        }
      }
    }
  }
}
// main file
include <../../lib/tray/card_tray.scad>
include <../../lib/compound/notched_cube.scad>
include <../../lib/config/card_sizes.scad>
include <../../lib/compound/tile_stack.scad>
include <../../lib/compound/tile_stack_round.scad>

tile_size = [
  20.5,
  20.5,
  2.2,
];
round_tile_diameter = 25;
tile_stack_count = 5;

cards = [
  [standard_usa_card_size],
  [mini_euro_card_size],
];
card_stack_height = 28;

card_tray_size = card_tray_grid_size(cards, card_stack_height);
token_tray_size = [0, padded_offset(tile_size[1]), 0];

box_size = [
  max(card_tray_size[0], token_tray_size[0]),
  card_tray_size[1] + token_tray_size[1],
  max(card_tray_size[2], token_tray_size[2]),
];

difference() {
  rounded_cube(box_size + [0, 0, 2], flat_top=true);

  translate([$wall_thickness, card_tray_size[1], 0]) {
    for (i=[0:2]) {
      translate([padded_offset(tile_size[0], i), 0, 0]) {
        if (i < 2) {
          tile_stack(
            tile_size,
            tile_stack_count,
            box_size[2],
            top_cutout = true,
            bottom_cutout = false
          );
        } else {
          tile_stack_round(
            round_tile_diameter,
            tile_size[2],
            tile_stack_count,
            box_size[2],
            top_cutout = true,
            bottom_cutout = false
          );
        }
      }
    }
  }

  card_tray_grid_cutout(cards, card_stack_height, top_cutout=false);
}
